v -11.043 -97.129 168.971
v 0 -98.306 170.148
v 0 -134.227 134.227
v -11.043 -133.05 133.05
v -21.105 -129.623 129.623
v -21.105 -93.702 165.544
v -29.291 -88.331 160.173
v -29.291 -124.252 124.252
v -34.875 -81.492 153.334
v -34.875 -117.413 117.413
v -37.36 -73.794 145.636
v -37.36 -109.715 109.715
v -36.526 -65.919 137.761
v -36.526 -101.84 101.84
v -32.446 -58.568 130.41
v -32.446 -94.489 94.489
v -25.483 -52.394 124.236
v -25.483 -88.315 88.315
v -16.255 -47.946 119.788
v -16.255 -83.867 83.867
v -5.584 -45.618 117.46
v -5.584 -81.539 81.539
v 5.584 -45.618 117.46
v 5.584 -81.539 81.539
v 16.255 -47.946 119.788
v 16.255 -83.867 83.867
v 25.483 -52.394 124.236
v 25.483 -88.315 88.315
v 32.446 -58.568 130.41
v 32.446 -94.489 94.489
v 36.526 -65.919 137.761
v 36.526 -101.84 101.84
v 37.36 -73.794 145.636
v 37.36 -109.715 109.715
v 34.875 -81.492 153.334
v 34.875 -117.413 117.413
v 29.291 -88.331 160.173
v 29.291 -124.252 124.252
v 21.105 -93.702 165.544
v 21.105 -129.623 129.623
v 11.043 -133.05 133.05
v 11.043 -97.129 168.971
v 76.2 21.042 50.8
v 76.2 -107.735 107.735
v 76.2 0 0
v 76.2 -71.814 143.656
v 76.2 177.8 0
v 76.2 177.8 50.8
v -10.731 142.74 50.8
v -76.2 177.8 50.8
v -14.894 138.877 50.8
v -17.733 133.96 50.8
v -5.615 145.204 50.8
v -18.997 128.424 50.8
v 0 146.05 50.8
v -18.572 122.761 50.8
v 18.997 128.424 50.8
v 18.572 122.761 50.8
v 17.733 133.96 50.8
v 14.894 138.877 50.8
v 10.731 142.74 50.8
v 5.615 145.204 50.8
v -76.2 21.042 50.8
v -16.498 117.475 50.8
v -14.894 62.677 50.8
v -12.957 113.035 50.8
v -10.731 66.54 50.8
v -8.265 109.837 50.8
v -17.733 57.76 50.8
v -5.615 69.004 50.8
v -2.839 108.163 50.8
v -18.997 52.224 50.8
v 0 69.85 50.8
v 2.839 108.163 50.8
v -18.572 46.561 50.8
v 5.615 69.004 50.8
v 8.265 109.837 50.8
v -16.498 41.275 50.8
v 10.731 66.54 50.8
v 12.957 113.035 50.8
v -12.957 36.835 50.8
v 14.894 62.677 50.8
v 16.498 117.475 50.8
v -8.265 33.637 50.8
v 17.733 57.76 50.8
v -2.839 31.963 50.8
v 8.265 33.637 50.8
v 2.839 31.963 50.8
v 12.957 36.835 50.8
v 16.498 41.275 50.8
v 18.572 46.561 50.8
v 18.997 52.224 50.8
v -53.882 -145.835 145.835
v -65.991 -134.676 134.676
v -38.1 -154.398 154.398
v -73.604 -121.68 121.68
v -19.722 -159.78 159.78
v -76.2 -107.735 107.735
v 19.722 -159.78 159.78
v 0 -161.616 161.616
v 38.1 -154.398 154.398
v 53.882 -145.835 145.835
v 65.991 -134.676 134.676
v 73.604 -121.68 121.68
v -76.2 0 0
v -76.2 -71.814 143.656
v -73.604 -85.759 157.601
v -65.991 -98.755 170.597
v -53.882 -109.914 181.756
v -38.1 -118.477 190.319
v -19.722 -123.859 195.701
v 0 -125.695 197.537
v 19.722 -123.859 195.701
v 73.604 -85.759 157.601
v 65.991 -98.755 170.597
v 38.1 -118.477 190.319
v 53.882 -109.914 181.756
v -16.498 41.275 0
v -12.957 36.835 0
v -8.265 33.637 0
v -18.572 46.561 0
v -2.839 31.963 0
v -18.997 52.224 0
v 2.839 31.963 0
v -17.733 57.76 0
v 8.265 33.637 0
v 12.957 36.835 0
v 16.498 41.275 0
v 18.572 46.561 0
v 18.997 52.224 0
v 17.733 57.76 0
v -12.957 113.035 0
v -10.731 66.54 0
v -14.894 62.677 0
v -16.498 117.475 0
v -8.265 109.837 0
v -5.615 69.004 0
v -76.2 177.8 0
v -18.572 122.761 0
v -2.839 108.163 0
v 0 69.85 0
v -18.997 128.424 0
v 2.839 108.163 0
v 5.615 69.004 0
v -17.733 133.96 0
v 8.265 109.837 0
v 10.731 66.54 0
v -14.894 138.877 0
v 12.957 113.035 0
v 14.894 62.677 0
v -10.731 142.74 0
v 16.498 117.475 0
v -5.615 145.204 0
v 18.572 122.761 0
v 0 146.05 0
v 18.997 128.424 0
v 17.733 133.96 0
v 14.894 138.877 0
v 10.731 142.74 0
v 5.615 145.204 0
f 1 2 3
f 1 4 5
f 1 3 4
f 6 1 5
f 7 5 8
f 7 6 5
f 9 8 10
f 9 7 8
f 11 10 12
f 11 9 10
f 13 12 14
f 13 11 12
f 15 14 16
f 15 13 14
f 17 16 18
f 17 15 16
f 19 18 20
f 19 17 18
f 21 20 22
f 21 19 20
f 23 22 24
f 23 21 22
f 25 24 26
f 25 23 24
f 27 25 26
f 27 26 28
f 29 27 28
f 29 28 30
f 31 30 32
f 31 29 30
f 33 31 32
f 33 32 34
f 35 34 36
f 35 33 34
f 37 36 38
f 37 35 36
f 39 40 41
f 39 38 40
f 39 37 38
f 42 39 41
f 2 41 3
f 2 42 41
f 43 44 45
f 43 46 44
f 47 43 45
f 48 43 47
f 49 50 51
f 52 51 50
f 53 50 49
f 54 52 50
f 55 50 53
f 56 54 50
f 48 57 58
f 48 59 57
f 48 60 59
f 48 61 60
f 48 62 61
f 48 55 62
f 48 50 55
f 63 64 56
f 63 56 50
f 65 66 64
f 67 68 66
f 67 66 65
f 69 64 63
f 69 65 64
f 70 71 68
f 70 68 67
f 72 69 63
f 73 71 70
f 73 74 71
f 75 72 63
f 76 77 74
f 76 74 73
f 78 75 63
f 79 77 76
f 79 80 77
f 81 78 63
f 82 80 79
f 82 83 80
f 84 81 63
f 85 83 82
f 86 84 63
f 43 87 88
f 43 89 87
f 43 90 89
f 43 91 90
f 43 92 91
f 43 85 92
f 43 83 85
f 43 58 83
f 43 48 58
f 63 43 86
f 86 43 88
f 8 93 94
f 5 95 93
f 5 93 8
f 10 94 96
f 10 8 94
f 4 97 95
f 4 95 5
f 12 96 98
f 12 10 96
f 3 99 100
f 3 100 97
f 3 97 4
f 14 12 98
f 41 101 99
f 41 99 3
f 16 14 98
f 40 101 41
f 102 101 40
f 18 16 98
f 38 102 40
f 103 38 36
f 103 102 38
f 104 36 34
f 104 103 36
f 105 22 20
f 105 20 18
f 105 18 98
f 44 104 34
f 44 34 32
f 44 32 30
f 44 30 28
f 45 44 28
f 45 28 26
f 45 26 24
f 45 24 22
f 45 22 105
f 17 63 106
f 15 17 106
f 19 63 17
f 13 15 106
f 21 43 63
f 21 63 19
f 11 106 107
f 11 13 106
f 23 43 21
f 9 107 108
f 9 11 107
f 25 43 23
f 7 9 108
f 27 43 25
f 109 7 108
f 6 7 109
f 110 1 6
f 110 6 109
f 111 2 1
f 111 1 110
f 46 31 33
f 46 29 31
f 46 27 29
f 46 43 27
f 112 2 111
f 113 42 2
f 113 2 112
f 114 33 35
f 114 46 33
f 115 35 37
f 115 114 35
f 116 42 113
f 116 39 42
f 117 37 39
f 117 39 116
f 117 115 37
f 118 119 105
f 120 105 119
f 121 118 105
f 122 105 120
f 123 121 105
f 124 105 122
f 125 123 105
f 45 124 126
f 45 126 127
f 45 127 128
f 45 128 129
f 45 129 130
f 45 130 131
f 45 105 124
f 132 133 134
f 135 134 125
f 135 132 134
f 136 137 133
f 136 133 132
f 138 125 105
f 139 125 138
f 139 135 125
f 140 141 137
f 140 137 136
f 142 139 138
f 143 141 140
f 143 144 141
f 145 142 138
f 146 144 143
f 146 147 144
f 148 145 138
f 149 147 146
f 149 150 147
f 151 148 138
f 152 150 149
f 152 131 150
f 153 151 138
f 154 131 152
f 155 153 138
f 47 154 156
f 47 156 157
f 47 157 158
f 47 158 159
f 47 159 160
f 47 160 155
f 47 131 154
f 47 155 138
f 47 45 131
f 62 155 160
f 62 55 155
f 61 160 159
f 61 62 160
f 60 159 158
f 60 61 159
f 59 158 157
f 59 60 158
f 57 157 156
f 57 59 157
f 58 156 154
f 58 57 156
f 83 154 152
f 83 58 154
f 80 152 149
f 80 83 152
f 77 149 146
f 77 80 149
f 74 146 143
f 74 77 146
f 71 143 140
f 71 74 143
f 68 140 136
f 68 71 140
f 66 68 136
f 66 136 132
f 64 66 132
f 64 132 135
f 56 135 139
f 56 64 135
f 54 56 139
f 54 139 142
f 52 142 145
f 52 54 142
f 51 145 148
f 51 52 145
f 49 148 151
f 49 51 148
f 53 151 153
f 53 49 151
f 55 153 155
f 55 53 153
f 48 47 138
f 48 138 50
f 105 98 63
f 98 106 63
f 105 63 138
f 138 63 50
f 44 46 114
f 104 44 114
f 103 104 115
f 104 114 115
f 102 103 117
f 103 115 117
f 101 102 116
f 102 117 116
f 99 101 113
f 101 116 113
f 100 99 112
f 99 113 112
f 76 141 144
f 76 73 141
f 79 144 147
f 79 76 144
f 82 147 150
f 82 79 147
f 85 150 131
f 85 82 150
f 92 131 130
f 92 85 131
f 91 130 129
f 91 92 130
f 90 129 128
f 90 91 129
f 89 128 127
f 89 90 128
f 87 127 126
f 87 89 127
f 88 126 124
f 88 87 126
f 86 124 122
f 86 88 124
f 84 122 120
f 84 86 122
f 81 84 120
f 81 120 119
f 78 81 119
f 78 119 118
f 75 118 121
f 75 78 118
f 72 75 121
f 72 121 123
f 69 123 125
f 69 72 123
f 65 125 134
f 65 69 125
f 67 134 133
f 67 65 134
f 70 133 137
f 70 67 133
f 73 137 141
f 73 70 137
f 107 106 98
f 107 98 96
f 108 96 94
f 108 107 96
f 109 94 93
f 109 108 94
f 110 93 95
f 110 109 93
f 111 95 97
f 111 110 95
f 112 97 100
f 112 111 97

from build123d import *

# Parameters (mm, degrees)
BOSS_EXTRUDE1_DEPTH = 76.2
CUT_EXTRUDE1_DEPTH  = 267.359355894
SKETCH4_R           = 19.05
CUT_EXTRUDE2_DEPTH  = 243.798558814


with BuildPart() as part:
    # Sketch2 → Boss-Extrude1 (new body)
    with BuildSketch(Plane.YZ):
        Polygon((0, 0), (177.8, 0), (177.8, 50.8), (21.042048969, 50.8), (-125.69533605, 197.537385018), (-161.616360534, 161.616360534), align=None)
    extrude(amount=BOSS_EXTRUDE1_DEPTH)

    # Sketch3 → Cut-Extrude1 (cut, through all)
    with BuildSketch(Plane(origin=(0, 35.921024484, 35.921024484), x_dir=(-1, 0, 0), z_dir=(0, 0.7071067811865488, 0.7071067811865464))):
        with BuildLine():
            Line((-76.2, 228.560048969), (-76.2, 152.360048969))
            ThreePointArc((-76.2, 152.360048969), (-53.881536726, 206.241585695), (0, 228.560048969))
            Line((0, 228.560048969), (-76.2, 228.560048969))
        make_face()
        with BuildLine():
            Line((0, 114.895048969), (0, 189.825048969))
            ThreePointArc((0, 189.825048969), (-37.465, 152.360048969), (0, 114.895048969))
        make_face()
        with BuildLine():
            ThreePointArc((37.465, 152.360048969), (26.491755557, 178.851804526), (0, 189.825048969))
            Line((0, 189.825048969), (0, 114.895048969))
            ThreePointArc((0, 114.895048969), (26.491755557, 125.868293411), (37.465, 152.360048969))
        make_face()
    extrude(amount=-CUT_EXTRUDE1_DEPTH, mode=Mode.SUBTRACT)

    # Sketch4 → Cut-Extrude2 (cut, through all)
    with BuildSketch(Plane.XY.offset(50.8)):
        with Locations((0, 127)):
            Circle(SKETCH4_R)
        with Locations((0, 50.8)):
            Circle(SKETCH4_R)
    extrude(amount=-CUT_EXTRUDE2_DEPTH, mode=Mode.SUBTRACT)

    # Mirror1: part across plane


with BuildPart() as part_1:
    add(part.part)
    add(part.part.mirror(Plane(origin=(0, 0, 0), x_dir=(0, 0, 1), z_dir=(1, 0, 0))))


solid = part_1.part
